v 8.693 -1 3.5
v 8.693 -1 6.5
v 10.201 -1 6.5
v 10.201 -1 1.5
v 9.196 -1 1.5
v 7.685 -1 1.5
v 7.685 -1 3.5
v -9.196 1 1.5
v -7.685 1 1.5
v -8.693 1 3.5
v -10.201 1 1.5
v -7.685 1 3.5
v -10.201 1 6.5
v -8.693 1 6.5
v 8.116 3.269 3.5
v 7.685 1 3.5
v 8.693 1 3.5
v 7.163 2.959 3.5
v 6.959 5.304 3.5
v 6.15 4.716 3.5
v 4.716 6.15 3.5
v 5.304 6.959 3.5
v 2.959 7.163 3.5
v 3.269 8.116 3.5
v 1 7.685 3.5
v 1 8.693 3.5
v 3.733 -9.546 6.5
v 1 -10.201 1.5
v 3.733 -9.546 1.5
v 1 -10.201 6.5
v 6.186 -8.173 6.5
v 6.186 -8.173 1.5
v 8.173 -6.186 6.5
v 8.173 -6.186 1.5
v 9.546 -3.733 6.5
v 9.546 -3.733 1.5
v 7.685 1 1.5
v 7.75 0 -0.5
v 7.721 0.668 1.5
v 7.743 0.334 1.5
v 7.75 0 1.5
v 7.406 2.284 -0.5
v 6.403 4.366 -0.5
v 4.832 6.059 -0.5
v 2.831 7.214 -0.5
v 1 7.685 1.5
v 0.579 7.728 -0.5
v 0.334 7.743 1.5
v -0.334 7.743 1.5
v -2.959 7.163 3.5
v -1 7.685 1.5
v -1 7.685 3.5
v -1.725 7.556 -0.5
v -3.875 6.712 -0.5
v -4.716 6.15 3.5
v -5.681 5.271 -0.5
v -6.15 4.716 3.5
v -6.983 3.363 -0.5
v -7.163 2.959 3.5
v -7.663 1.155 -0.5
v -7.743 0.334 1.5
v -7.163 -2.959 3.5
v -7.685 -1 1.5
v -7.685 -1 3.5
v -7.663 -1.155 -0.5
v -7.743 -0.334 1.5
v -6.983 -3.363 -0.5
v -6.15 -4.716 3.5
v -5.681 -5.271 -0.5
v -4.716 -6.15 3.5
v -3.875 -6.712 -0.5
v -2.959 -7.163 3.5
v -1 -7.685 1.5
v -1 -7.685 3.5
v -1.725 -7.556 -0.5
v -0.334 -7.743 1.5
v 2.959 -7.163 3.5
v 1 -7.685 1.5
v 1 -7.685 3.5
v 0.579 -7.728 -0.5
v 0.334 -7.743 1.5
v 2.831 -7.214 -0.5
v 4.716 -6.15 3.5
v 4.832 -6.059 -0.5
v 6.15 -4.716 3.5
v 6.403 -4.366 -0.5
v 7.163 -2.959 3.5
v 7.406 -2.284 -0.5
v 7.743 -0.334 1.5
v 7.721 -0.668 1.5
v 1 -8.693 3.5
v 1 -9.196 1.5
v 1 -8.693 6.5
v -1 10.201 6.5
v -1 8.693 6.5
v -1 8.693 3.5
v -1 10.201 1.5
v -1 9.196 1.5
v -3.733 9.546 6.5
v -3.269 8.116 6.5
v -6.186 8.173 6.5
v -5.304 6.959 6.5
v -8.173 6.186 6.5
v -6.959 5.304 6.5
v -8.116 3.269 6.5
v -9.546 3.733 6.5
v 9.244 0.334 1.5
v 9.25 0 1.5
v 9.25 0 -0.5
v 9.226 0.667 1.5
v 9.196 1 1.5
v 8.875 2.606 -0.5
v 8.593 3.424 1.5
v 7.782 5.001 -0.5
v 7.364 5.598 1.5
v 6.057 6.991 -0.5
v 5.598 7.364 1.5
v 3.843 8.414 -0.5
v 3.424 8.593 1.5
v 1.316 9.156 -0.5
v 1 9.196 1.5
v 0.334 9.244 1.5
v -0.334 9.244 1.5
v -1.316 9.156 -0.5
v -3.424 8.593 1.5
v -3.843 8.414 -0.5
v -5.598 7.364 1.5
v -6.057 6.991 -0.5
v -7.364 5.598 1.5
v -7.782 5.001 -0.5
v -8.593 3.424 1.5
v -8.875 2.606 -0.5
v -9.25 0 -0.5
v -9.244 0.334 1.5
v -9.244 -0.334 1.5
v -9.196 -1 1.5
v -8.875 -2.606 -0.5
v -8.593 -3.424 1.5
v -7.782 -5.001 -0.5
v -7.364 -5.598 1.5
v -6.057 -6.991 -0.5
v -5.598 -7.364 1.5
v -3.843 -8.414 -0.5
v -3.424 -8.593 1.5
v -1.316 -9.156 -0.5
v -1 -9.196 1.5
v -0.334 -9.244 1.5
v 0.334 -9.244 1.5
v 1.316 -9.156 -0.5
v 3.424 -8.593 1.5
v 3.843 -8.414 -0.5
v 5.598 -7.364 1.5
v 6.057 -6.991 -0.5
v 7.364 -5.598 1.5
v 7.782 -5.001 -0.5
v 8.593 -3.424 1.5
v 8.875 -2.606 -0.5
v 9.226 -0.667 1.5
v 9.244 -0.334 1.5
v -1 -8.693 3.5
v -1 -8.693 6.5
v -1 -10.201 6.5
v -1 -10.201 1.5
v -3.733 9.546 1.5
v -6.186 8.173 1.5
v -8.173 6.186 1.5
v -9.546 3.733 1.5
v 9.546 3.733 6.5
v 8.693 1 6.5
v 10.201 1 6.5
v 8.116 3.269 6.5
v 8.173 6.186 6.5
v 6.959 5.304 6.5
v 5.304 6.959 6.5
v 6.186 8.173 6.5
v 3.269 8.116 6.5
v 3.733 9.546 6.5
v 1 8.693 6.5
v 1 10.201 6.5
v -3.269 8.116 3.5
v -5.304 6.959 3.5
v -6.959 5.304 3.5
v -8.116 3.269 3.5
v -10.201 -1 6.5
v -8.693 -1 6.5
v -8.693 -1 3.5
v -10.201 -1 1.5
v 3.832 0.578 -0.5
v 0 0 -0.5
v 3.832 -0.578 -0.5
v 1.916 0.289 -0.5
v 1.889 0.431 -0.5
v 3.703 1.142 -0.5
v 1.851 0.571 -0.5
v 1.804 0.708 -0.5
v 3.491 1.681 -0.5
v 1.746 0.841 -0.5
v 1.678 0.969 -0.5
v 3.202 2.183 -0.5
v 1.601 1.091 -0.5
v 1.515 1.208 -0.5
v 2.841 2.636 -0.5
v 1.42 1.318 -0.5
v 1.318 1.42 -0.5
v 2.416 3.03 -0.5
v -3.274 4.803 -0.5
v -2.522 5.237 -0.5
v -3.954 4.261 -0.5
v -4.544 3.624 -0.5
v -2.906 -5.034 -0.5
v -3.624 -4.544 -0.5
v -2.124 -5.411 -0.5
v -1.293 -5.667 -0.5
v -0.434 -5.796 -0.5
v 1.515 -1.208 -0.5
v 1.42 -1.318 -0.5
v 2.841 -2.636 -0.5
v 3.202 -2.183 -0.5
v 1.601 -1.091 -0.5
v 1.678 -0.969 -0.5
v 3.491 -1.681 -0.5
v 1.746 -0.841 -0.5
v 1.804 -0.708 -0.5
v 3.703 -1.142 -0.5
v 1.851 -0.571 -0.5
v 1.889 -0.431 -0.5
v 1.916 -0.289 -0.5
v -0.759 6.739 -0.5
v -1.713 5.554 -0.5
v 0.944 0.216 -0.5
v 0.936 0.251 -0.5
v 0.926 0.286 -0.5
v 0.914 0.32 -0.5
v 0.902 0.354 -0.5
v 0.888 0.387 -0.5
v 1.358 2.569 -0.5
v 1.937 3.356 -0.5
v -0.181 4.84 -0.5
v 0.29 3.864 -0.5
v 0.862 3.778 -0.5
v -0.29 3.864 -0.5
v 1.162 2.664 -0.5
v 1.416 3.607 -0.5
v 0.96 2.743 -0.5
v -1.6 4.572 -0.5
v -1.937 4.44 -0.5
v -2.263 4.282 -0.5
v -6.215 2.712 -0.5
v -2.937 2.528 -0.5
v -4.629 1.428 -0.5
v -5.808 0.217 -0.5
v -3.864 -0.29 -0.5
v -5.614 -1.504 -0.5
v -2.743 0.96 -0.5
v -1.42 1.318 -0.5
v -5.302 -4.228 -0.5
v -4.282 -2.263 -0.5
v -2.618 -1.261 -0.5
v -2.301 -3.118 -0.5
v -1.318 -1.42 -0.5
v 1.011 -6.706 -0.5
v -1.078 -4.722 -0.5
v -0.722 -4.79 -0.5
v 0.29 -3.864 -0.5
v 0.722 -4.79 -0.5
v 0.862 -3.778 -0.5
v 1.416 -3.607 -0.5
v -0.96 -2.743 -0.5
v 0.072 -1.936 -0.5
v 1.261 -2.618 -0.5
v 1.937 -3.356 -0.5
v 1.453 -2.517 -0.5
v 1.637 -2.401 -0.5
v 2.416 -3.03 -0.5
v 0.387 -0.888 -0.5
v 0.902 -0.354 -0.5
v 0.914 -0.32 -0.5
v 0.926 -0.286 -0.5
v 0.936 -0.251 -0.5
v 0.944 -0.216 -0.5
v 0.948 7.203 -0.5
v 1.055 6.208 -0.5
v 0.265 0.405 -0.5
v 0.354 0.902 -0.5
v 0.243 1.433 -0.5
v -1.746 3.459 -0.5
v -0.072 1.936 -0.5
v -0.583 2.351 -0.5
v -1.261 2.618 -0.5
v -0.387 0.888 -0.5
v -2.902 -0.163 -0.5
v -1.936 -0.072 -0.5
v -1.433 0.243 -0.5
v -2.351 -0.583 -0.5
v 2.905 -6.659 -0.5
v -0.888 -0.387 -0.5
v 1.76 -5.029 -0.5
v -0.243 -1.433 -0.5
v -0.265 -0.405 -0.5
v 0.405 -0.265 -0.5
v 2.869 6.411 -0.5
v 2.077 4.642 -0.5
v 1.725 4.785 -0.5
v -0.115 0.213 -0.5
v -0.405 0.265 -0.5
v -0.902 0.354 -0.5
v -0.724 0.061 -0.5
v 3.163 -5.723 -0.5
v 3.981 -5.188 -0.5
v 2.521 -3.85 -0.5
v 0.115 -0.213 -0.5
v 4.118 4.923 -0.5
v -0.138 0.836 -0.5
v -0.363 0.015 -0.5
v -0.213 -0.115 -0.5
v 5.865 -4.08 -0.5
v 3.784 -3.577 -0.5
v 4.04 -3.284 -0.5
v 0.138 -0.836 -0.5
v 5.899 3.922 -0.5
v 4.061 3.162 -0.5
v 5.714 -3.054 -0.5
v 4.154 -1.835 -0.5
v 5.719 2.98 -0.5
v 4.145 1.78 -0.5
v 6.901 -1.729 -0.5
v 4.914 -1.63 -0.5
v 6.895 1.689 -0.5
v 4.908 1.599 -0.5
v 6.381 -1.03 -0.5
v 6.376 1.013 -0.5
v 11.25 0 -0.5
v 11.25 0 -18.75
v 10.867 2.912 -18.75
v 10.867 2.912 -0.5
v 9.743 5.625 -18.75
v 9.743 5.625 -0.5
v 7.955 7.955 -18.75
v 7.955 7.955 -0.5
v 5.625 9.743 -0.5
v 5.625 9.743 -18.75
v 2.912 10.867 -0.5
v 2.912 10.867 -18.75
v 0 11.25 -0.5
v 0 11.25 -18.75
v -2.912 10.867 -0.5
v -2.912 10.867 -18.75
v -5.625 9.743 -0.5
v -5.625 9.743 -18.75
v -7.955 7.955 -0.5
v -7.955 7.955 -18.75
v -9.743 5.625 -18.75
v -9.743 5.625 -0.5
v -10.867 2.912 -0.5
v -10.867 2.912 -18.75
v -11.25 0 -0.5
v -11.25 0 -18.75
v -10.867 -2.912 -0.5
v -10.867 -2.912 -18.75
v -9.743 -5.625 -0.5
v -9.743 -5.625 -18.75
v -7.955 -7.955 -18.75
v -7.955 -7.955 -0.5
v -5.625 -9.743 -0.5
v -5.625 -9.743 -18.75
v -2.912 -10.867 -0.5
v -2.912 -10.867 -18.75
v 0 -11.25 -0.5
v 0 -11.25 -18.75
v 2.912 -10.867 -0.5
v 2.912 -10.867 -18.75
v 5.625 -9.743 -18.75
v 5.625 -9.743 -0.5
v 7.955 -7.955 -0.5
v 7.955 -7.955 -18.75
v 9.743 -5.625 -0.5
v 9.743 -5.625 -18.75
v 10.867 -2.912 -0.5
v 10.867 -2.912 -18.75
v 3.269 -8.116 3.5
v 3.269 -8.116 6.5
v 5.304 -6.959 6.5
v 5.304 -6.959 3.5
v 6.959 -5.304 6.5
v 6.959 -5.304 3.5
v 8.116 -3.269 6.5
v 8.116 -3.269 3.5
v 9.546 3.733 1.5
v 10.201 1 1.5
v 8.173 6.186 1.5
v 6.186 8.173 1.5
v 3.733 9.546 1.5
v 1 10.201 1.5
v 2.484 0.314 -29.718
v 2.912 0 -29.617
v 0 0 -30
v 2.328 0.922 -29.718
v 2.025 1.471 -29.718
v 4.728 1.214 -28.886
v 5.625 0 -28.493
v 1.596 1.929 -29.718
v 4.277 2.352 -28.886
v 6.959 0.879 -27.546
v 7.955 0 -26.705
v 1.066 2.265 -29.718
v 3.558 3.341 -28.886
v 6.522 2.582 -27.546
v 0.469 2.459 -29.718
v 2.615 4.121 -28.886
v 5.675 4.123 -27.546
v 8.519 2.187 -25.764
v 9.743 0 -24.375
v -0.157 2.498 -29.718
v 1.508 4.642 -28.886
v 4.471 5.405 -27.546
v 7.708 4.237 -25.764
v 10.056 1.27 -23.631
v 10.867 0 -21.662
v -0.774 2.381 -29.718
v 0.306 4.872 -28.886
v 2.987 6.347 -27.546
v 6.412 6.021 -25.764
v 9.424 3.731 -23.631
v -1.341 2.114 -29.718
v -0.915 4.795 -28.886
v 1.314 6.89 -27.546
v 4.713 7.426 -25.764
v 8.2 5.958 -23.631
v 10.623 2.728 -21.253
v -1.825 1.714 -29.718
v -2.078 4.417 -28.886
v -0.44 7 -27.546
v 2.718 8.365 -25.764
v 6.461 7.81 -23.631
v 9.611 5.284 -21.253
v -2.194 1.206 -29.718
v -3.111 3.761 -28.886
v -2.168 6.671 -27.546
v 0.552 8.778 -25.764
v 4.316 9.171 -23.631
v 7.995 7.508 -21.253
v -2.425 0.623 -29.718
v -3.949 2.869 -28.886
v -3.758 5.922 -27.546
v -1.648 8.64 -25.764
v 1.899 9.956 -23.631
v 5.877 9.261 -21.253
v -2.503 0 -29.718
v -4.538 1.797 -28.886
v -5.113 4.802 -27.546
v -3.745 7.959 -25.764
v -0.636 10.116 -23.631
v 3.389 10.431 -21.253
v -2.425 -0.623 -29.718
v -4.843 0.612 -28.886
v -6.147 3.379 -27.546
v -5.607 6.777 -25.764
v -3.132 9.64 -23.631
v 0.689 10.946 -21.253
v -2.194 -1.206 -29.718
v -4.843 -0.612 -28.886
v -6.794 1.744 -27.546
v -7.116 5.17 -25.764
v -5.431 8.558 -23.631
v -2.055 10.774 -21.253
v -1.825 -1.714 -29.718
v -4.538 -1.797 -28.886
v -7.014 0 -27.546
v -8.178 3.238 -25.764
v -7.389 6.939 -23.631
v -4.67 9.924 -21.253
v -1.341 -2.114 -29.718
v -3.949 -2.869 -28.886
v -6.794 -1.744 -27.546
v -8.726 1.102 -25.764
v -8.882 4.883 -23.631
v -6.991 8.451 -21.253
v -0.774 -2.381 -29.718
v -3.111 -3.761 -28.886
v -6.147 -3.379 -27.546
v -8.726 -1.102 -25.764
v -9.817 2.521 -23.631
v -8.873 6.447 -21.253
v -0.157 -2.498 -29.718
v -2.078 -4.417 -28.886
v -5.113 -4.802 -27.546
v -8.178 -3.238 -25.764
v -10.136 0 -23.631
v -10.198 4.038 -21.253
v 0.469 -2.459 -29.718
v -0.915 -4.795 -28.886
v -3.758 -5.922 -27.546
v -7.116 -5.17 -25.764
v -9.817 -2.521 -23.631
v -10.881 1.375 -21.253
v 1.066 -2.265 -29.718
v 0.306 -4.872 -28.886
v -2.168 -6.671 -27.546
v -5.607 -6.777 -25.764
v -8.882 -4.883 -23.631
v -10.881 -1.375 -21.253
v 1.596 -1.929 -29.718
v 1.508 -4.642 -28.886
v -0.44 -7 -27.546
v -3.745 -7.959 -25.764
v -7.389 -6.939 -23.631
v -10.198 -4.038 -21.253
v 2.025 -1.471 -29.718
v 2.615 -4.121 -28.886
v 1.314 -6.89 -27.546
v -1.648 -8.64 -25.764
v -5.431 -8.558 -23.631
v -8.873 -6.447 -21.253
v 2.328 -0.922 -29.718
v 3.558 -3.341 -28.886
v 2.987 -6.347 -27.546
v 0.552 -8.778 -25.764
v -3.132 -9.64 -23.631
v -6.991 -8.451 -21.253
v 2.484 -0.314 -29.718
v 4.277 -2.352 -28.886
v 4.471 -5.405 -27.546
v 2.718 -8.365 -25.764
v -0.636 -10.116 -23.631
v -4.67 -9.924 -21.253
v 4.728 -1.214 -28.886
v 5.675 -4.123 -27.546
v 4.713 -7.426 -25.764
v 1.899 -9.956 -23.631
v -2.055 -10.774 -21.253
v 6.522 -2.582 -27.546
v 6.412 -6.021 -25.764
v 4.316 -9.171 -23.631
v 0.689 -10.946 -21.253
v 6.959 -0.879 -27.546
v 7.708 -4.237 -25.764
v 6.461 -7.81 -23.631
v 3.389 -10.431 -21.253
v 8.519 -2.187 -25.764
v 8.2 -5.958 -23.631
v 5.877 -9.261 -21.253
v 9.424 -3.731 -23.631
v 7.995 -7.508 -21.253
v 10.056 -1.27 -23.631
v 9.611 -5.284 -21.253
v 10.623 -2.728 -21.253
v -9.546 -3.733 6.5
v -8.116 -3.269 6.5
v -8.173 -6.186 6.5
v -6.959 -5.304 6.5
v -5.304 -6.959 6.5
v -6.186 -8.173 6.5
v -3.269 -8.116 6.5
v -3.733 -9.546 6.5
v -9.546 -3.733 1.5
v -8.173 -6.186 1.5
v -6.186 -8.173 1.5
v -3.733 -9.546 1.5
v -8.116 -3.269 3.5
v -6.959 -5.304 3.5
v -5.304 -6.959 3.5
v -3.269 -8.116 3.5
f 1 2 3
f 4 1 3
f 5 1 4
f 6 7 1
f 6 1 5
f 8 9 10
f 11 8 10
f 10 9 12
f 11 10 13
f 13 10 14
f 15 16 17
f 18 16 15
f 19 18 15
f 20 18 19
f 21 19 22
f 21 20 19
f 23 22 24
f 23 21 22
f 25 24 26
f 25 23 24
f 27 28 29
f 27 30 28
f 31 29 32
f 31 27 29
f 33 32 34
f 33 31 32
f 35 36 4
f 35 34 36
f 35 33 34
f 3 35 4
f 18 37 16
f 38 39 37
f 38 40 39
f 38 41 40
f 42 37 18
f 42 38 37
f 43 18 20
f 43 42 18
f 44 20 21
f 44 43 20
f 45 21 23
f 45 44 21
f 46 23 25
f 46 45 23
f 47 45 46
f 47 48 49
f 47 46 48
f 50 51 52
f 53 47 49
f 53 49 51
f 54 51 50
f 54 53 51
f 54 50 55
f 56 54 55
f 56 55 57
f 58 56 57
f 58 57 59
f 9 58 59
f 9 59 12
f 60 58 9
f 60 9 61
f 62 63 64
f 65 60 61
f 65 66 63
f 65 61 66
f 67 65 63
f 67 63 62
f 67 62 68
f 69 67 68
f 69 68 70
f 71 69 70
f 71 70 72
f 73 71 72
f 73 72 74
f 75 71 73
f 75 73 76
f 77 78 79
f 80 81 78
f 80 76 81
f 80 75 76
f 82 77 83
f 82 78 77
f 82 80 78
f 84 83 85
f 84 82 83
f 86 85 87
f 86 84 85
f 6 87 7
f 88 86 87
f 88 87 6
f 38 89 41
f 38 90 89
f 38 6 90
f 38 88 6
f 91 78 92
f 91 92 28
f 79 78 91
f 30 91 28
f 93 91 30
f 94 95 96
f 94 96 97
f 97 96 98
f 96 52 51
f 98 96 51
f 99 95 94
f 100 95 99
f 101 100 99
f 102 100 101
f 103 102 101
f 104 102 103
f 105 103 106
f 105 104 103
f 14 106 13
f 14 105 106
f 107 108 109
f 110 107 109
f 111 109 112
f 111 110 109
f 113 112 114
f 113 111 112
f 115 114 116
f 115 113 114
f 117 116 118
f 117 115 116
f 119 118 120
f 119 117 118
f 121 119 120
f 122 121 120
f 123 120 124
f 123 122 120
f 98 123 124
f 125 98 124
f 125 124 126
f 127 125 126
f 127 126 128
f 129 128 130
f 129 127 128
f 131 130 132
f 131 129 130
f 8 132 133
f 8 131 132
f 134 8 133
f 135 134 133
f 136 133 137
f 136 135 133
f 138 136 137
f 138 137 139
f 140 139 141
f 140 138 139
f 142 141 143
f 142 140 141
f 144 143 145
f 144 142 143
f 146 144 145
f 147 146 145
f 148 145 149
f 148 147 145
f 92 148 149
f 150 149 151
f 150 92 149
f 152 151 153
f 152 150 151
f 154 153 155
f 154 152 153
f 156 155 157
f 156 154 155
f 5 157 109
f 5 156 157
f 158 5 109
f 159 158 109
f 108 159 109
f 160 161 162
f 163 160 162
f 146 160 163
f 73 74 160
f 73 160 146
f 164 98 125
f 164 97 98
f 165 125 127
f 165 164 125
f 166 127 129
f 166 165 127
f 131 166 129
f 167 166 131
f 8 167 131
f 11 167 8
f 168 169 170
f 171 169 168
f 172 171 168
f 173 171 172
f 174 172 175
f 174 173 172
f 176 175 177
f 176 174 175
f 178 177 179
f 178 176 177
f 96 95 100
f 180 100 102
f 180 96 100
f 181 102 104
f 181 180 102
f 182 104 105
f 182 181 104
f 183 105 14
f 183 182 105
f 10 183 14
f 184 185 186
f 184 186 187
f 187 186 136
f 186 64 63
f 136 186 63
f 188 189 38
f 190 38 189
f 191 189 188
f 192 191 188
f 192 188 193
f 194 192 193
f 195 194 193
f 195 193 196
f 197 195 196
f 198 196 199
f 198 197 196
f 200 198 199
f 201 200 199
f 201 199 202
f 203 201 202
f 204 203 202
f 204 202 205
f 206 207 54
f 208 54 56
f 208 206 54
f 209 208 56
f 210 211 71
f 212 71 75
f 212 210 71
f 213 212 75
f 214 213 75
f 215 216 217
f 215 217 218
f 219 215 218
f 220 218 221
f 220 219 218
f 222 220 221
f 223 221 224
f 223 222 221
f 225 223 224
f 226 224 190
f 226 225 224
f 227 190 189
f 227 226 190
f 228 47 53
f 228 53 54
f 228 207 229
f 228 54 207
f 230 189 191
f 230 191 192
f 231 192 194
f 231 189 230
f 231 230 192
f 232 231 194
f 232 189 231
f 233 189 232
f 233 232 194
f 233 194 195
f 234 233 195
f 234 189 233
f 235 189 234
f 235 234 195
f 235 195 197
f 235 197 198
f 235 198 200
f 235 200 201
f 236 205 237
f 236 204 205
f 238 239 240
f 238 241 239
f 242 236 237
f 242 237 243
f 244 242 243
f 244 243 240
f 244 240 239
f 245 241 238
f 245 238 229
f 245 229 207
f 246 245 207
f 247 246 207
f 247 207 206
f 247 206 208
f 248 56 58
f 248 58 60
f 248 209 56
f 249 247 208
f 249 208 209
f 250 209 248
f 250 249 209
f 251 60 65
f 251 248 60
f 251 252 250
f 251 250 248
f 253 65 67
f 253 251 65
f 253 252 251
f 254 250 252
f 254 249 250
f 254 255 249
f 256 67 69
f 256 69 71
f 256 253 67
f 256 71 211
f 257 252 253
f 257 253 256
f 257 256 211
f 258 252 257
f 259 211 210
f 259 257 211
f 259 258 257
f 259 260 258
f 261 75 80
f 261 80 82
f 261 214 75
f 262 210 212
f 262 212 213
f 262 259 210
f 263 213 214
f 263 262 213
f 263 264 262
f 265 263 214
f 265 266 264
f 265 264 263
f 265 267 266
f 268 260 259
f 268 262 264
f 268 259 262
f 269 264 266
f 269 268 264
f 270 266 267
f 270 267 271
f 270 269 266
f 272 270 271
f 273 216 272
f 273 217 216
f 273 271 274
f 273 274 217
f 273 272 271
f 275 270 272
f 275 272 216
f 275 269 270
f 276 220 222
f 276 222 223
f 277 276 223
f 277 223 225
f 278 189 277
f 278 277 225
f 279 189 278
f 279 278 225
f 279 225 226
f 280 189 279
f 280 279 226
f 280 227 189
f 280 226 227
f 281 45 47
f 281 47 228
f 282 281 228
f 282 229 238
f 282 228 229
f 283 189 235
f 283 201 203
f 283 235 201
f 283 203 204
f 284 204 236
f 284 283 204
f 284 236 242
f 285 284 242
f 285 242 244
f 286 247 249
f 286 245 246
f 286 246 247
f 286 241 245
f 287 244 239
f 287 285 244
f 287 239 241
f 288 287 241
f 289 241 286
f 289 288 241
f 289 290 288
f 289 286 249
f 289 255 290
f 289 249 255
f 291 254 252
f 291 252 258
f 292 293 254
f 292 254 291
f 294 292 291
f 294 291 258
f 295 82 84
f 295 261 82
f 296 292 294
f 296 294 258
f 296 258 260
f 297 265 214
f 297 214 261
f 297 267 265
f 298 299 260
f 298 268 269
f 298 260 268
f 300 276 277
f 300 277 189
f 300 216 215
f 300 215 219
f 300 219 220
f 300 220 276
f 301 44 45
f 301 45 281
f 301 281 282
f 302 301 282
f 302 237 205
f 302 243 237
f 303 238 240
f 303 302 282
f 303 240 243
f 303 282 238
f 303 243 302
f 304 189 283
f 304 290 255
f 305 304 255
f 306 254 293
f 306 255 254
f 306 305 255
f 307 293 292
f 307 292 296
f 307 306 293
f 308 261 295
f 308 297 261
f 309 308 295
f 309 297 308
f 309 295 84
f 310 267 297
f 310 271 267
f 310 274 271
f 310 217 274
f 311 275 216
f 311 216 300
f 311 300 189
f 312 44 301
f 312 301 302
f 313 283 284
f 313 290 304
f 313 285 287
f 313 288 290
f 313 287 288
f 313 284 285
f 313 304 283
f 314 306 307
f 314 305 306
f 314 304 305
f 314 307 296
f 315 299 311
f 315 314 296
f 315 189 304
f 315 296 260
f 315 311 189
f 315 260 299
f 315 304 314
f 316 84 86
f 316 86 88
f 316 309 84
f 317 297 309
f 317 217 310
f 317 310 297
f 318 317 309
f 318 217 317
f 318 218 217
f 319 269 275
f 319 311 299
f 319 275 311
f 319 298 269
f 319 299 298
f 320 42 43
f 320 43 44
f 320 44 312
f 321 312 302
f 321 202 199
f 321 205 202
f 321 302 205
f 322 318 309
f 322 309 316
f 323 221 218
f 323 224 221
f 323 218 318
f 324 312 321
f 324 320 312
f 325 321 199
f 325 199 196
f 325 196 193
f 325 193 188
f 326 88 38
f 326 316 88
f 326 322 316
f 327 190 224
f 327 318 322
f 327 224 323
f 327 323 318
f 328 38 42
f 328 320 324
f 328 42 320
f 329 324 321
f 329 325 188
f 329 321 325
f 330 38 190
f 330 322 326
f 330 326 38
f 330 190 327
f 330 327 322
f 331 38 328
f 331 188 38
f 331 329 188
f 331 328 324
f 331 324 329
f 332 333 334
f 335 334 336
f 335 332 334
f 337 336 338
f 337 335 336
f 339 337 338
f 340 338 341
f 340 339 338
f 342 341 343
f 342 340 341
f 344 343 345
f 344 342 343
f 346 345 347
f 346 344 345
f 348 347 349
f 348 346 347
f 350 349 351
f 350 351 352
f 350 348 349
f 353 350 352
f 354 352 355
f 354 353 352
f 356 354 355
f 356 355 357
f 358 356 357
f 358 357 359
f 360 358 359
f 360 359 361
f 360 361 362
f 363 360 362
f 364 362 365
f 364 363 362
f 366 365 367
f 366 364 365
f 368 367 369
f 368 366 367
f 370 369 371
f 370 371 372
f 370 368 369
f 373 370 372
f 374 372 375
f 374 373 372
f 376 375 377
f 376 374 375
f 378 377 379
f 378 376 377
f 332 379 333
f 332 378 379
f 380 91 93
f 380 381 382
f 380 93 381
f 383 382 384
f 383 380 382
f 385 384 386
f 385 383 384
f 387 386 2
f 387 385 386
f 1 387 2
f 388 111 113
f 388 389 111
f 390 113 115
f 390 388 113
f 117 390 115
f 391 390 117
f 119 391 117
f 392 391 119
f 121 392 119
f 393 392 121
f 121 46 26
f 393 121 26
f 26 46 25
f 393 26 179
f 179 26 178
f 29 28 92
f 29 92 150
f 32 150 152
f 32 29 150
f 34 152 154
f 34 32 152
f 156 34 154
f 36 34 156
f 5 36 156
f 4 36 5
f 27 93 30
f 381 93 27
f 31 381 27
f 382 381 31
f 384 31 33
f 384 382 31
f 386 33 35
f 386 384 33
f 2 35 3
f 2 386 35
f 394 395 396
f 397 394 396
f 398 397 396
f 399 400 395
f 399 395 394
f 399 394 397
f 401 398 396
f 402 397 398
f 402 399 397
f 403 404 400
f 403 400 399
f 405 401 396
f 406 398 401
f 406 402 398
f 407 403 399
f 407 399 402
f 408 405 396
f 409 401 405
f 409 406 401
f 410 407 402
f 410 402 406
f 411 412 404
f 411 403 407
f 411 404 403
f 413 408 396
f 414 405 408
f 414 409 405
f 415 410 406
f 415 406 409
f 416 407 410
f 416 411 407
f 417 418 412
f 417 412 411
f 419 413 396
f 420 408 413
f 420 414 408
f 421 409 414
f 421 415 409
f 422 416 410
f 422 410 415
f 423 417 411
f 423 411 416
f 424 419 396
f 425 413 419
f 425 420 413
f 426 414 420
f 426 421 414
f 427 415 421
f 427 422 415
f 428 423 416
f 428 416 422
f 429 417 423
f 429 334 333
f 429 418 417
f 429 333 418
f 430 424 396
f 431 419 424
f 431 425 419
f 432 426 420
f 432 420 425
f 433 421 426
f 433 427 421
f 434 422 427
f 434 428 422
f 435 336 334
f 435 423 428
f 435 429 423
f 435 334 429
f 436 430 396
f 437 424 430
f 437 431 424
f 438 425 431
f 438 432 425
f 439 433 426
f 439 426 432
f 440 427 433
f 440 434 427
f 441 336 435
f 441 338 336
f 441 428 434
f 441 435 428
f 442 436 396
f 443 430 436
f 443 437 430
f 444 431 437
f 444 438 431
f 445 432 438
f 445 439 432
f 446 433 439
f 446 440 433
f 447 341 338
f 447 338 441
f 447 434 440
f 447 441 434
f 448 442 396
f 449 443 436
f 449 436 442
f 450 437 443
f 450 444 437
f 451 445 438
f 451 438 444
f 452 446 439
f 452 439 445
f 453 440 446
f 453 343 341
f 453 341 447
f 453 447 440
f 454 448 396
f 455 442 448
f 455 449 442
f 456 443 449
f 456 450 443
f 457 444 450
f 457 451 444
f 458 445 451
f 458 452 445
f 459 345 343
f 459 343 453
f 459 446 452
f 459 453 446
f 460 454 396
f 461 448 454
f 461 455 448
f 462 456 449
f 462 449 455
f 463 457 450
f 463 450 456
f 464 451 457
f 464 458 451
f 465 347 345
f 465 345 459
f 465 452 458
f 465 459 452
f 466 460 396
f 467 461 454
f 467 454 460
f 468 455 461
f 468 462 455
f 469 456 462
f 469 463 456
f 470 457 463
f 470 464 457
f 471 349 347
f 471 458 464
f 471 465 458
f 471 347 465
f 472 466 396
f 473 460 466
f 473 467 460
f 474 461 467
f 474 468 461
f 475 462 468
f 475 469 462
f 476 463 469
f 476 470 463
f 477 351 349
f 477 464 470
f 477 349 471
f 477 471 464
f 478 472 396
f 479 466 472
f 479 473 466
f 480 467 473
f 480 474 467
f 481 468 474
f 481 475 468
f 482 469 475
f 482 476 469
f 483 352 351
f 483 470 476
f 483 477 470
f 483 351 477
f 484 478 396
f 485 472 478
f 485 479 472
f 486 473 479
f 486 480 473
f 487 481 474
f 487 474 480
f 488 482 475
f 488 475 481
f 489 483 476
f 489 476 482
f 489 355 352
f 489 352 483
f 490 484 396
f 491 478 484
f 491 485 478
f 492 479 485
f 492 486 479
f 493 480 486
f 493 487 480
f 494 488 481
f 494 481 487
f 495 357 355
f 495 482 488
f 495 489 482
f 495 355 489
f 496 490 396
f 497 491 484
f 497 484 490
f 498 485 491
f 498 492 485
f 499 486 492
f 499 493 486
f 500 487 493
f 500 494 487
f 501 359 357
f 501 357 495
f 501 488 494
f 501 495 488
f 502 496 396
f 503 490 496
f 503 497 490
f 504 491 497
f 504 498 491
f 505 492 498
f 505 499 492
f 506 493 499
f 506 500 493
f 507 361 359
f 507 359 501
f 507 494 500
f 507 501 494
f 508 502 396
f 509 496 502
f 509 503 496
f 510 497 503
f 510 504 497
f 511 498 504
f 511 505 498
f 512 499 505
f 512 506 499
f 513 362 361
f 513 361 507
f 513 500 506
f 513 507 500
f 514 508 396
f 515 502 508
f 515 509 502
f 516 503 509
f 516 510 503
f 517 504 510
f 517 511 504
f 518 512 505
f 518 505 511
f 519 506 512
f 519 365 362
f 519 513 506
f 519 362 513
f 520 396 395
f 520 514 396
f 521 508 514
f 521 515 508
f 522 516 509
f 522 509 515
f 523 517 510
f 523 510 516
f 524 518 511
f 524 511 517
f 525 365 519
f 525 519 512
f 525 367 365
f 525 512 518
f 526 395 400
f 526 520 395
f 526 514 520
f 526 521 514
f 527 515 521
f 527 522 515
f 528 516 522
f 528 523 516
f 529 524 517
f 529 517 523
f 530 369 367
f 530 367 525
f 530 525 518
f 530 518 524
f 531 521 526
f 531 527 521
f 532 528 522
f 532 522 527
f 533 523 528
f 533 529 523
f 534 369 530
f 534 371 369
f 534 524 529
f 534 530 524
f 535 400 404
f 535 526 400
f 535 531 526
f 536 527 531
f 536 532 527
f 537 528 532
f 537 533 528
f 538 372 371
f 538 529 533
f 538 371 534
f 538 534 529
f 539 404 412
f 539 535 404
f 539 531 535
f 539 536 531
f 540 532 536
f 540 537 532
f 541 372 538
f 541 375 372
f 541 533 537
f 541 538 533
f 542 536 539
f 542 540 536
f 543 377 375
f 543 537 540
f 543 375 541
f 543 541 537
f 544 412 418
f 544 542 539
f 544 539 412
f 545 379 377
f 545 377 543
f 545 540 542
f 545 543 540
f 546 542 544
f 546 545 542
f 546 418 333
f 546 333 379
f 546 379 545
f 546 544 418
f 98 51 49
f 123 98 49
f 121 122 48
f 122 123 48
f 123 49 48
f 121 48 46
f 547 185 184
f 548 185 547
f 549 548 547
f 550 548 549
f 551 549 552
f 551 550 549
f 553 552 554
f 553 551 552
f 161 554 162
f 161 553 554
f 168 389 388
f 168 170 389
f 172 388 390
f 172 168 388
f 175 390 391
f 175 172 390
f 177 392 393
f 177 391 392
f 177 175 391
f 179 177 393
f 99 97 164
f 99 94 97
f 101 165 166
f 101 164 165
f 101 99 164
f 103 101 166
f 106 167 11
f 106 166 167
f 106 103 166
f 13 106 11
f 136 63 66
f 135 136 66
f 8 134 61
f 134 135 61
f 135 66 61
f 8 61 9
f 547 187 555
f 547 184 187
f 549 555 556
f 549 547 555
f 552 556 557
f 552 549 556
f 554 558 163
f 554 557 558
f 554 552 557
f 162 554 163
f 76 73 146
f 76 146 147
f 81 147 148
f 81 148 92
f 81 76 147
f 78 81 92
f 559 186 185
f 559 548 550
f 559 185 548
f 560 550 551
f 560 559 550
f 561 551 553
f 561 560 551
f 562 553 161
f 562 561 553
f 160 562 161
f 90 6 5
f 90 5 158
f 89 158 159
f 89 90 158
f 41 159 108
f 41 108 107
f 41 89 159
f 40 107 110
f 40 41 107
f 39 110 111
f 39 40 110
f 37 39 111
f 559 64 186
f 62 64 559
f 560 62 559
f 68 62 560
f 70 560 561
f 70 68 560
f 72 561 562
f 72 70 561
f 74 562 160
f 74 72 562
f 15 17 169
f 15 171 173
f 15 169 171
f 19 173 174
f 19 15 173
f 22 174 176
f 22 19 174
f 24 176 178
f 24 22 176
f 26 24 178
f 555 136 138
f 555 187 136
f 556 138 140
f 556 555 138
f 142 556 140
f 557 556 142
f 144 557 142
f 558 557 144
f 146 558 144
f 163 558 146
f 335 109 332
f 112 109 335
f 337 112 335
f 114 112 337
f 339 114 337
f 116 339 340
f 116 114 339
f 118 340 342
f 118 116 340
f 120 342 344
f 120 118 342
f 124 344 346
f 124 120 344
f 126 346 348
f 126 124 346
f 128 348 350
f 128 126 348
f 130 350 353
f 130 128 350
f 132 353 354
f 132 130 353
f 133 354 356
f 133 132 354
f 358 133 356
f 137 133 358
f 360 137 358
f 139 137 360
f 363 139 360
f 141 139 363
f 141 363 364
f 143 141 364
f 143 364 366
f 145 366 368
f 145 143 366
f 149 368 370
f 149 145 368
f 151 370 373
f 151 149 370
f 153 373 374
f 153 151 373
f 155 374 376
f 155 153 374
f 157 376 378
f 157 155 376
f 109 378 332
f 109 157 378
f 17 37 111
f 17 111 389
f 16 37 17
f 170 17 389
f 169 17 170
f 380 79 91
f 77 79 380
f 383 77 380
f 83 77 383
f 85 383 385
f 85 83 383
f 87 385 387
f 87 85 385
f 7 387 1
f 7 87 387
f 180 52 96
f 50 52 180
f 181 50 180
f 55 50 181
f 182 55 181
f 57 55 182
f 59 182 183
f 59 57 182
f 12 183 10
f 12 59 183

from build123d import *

# Parameters (mm, degrees)
F3_DEPTH      = 25
F3_DEPTH_BACK = 25
F5_DEPTH      = 25
F5_DEPTH_BACK = 25


with BuildPart() as f2:
    # F2: sweep along a path in F1
    with BuildLine(Plane.XY) as f2_path:
        CenterArc((0, 0), 11.25, 0, 360)
    # F0 (on Front) → F2 (sweep)
    with BuildSketch(Plane.XZ):
        with BuildLine():
            Line((10.25, -0.5), (9.25, -0.5))
            Line((9.25, -0.5), (7.75, -0.5))
            Line((7.75, -0.5), (1, -0.5))
            Line((1, -0.5), (0, -0.5))
            Line((0, -0.5), (0, -30))
            ThreePointArc((0, -30), (7.9549512883, -26.7049512883), (11.25, -18.75))
            Line((11.25, -18.75), (11.25, -0.5))
            Line((11.25, -0.5), (10.25, -0.5))
        make_face()
        Polygon((9.25, 1.5), (10.25, 1.5), (10.25, 6.5), (8.75, 6.5), (8.75, 3.5), (7.75, 3.5), (7.75, -0.5), (9.25, -0.5), align=None)
    sweep(path=f2_path.line)

    # F0 (on Front) → F3 (cut, two sides)
    with BuildSketch(Plane.XZ) as f3_sk:
        Polygon((-1, 1.5), (1, 1.5), (1, 6.5), (0, 6.5), (-1, 6.5), align=None)
    extrude(amount=-F3_DEPTH, mode=Mode.SUBTRACT)
    extrude(f3_sk.sketch, amount=F3_DEPTH_BACK, mode=Mode.SUBTRACT)

    # F4 (on Right) → F5 (cut, two sides)
    with BuildSketch(Plane.YZ) as f5_sk:
        Polygon((-1, 1.5), (0, 1.5), (1, 1.5), (1, 6.5), (-1, 6.5), align=None)
    extrude(amount=-F5_DEPTH, mode=Mode.SUBTRACT)
    extrude(f5_sk.sketch, amount=F5_DEPTH_BACK, mode=Mode.SUBTRACT)


solid = f2.part
